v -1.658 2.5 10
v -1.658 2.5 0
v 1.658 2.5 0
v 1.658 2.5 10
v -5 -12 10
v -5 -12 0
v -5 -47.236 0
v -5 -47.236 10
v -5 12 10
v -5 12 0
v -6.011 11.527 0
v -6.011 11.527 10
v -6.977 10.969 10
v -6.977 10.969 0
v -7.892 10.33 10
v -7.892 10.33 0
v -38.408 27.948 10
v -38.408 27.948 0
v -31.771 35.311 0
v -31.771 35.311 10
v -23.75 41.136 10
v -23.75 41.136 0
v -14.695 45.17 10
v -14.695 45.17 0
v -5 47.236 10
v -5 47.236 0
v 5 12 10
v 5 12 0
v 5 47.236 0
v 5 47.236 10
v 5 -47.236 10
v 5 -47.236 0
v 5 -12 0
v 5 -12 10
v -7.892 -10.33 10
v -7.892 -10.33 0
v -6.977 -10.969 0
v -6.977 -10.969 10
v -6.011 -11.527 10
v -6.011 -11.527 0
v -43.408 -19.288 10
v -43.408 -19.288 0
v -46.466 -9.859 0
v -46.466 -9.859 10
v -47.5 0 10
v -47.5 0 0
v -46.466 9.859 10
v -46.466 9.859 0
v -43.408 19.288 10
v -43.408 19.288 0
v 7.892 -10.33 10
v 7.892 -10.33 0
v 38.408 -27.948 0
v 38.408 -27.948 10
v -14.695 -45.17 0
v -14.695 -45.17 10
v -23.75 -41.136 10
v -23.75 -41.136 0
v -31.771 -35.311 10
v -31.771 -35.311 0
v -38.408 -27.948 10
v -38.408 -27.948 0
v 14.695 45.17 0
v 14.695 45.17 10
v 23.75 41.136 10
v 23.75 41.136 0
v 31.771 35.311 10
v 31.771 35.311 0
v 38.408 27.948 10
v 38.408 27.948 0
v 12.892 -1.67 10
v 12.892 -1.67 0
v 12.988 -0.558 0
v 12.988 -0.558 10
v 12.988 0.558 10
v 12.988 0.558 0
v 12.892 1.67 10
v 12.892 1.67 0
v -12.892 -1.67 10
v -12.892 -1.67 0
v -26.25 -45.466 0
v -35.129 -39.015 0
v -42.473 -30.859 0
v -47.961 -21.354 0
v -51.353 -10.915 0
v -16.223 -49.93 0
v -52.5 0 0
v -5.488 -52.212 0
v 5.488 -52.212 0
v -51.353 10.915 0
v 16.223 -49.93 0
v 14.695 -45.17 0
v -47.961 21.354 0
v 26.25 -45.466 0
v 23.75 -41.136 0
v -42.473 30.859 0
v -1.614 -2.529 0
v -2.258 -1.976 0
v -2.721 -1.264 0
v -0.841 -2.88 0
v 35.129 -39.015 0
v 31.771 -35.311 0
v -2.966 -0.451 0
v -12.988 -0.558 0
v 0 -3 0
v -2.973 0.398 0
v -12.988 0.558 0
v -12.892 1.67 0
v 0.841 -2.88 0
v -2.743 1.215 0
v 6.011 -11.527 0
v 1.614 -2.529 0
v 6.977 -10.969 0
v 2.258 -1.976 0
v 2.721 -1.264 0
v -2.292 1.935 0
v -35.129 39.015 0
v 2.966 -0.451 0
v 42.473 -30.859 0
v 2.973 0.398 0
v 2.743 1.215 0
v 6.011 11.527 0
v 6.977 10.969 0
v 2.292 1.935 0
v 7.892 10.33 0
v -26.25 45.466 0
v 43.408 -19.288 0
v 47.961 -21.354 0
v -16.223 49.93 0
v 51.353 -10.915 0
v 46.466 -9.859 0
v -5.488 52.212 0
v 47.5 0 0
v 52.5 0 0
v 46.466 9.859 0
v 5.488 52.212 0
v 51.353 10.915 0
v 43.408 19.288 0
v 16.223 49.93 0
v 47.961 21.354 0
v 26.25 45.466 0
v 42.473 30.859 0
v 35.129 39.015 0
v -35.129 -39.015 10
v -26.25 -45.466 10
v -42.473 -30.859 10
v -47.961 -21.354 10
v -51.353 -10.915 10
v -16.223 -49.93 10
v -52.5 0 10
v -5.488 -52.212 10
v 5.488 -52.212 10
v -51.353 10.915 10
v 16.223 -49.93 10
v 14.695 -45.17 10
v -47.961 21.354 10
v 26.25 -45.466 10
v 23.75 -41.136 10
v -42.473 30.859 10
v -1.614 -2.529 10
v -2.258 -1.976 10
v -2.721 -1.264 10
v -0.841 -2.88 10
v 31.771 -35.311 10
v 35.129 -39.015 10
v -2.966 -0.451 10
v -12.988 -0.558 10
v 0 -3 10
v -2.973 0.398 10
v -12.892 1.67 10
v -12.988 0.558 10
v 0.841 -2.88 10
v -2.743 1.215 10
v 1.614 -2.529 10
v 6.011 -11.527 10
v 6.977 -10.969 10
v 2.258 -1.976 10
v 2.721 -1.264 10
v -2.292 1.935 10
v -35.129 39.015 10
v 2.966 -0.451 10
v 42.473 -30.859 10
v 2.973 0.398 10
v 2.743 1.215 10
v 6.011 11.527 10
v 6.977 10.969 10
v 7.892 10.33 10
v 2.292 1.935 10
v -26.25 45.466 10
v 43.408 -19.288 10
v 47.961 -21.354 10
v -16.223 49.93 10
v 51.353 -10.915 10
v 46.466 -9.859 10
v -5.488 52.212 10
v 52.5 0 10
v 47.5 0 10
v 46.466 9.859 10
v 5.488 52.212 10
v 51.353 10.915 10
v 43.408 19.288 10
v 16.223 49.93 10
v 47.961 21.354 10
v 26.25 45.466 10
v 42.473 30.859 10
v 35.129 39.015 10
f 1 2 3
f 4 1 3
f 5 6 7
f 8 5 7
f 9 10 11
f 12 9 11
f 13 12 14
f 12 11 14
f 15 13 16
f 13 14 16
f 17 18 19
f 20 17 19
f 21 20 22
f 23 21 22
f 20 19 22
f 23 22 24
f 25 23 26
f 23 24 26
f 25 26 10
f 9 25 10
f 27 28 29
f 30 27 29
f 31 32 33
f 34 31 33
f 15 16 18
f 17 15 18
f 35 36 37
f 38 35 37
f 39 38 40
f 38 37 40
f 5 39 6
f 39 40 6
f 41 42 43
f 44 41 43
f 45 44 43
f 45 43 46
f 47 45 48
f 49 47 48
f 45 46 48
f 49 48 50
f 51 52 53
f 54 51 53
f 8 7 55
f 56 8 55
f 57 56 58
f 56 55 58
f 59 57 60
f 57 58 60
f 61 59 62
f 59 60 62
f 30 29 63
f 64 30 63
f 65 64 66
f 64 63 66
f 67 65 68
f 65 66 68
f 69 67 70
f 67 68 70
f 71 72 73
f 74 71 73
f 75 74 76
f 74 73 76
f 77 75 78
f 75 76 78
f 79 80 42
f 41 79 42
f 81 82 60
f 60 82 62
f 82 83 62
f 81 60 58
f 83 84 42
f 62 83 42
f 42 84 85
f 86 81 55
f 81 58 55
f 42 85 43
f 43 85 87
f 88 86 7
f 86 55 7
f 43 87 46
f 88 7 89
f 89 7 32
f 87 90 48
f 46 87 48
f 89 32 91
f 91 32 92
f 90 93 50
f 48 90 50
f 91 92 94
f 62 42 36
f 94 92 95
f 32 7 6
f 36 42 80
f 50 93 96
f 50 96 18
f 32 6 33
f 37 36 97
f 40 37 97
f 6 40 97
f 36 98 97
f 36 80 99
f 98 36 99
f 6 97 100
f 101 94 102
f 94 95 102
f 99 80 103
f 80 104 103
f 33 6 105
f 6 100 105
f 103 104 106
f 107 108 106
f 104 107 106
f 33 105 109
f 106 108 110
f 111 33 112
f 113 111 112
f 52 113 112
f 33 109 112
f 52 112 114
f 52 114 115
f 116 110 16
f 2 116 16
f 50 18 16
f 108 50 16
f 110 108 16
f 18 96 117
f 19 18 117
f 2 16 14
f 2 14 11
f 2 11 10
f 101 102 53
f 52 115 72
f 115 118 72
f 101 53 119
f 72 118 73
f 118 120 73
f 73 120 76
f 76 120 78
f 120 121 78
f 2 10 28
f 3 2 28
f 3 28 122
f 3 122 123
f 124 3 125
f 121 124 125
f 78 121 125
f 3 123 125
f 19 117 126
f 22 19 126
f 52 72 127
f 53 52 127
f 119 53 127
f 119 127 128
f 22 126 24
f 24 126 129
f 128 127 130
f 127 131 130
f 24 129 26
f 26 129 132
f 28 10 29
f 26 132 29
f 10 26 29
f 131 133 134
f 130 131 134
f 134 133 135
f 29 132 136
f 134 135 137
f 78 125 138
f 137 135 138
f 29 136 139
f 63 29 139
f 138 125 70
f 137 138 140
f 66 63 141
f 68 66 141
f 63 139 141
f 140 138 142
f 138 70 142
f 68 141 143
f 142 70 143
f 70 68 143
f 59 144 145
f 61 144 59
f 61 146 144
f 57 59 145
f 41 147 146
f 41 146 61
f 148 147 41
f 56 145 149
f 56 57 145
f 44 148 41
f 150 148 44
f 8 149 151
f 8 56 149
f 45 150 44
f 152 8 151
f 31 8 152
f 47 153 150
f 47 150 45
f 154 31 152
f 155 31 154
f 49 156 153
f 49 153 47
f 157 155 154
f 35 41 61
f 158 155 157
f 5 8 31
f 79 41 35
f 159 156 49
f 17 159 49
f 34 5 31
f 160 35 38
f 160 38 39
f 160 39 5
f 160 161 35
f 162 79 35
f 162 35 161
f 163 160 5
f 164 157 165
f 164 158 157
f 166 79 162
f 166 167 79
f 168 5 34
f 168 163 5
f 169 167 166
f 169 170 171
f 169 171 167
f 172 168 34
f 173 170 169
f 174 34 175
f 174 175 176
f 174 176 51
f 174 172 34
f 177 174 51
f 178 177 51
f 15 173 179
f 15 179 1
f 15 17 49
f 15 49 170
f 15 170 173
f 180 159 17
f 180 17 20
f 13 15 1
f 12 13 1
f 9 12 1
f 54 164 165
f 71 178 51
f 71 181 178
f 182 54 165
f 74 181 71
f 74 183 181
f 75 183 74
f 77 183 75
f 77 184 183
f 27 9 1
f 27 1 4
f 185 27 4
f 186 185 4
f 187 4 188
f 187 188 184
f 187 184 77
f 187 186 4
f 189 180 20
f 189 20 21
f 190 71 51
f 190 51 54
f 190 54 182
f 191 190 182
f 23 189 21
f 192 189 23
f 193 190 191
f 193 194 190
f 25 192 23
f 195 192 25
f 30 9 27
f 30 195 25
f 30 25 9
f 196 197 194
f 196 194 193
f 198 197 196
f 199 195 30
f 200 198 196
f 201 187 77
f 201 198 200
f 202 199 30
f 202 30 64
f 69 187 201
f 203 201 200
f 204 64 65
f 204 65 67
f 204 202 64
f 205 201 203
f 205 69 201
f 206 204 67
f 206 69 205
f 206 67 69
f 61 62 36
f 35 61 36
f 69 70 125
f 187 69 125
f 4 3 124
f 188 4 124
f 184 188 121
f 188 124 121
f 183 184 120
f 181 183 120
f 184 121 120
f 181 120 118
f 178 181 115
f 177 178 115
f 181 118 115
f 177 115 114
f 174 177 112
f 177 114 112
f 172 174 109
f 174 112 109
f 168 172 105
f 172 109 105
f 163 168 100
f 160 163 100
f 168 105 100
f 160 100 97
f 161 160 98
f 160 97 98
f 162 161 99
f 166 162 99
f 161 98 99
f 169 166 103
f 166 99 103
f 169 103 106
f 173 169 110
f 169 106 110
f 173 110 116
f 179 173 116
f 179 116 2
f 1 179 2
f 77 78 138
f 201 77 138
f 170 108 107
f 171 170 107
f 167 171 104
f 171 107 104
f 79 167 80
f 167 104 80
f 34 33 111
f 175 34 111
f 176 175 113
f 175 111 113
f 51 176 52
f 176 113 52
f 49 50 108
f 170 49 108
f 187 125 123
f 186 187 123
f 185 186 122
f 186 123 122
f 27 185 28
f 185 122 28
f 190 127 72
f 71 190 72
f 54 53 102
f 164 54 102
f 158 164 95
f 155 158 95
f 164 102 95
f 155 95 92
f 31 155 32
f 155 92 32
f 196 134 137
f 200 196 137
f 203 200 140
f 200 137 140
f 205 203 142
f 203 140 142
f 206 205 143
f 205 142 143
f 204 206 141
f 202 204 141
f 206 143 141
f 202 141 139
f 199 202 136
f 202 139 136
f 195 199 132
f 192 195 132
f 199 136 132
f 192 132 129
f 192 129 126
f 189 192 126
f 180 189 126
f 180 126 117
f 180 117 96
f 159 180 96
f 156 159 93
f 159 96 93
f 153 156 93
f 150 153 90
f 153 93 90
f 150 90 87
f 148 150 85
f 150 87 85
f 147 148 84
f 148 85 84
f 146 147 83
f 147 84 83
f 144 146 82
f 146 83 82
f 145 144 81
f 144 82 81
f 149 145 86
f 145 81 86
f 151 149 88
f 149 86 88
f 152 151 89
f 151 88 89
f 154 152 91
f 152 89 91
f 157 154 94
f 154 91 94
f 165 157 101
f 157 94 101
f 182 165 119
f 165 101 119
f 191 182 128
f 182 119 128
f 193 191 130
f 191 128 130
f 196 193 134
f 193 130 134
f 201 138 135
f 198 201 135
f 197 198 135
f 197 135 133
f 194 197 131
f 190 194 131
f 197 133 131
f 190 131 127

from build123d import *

# Parameters (mm, degrees)
SKETCH1_R           = 52.5
BOSS_EXTRUDE1_DEPTH = 10


with BuildPart() as part:
    # Sketch1 → Boss-Extrude1 (new body)
    with BuildSketch(Plane.XY):
        Circle(SKETCH1_R)
        with BuildLine():
            ThreePointArc((38.40767043, -27.948181554), (23.75, -41.13620668), (5, -47.236109069))
            Line((5, -47.236109069), (5, -12))
            ThreePointArc((5, -12), (6.5, -11.258330249), (7.892304845, -10.330127019))
            Line((7.892304845, -10.330127019), (38.40767043, -27.948181554))
        make_face(mode=Mode.SUBTRACT)
        with BuildLine():
            ThreePointArc((-5, -47.236109069), (-23.75, -41.13620668), (-38.40767043, -27.948181554))
            Line((-38.40767043, -27.948181554), (-7.892304845, -10.330127019))
            ThreePointArc((-7.892304845, -10.330127019), (-6.5, -11.258330249), (-5, -12))
            Line((-5, -12), (-5, -47.236109069))
        make_face(mode=Mode.SUBTRACT)
        with BuildLine():
            Line((-1.658312395, 2.5), (1.658312395, 2.5))
            ThreePointArc((1.658312395, 2.5), (0, -3), (-1.658312395, 2.5))
        make_face(mode=Mode.SUBTRACT)
        with BuildLine():
            ThreePointArc((-43.40767043, -19.287927516), (-47.5, 0), (-43.40767043, 19.287927516))
            Line((-43.40767043, 19.287927516), (-12.892304845, 1.669872981))
            ThreePointArc((-12.892304845, 1.669872981), (-13, 0), (-12.892304845, -1.669872981))
            Line((-12.892304845, -1.669872981), (-43.40767043, -19.287927516))
        make_face(mode=Mode.SUBTRACT)
        with BuildLine():
            Line((-5, 47.236109069), (-5, 12))
            ThreePointArc((-5, 12), (-6.5, 11.258330249), (-7.892304845, 10.330127019))
            Line((-7.892304845, 10.330127019), (-38.40767043, 27.948181554))
            ThreePointArc((-38.40767043, 27.948181554), (-23.75, 41.13620668), (-5, 47.236109069))
        make_face(mode=Mode.SUBTRACT)
        with BuildLine():
            ThreePointArc((43.40767043, 19.287927516), (47.5, 0), (43.40767043, -19.287927516))
            Line((43.40767043, -19.287927516), (12.892304845, -1.669872981))
            ThreePointArc((12.892304845, -1.669872981), (13, 0), (12.892304845, 1.669872981))
            Line((12.892304845, 1.669872981), (43.40767043, 19.287927516))
        make_face(mode=Mode.SUBTRACT)
        with BuildLine():
            ThreePointArc((5, 47.236109069), (23.75, 41.13620668), (38.40767043, 27.948181554))
            Line((38.40767043, 27.948181554), (7.892304845, 10.330127019))
            ThreePointArc((7.892304845, 10.330127019), (6.5, 11.258330249), (5, 12))
            Line((5, 12), (5, 47.236109069))
        make_face(mode=Mode.SUBTRACT)
    extrude(amount=BOSS_EXTRUDE1_DEPTH)


solid = part.part
